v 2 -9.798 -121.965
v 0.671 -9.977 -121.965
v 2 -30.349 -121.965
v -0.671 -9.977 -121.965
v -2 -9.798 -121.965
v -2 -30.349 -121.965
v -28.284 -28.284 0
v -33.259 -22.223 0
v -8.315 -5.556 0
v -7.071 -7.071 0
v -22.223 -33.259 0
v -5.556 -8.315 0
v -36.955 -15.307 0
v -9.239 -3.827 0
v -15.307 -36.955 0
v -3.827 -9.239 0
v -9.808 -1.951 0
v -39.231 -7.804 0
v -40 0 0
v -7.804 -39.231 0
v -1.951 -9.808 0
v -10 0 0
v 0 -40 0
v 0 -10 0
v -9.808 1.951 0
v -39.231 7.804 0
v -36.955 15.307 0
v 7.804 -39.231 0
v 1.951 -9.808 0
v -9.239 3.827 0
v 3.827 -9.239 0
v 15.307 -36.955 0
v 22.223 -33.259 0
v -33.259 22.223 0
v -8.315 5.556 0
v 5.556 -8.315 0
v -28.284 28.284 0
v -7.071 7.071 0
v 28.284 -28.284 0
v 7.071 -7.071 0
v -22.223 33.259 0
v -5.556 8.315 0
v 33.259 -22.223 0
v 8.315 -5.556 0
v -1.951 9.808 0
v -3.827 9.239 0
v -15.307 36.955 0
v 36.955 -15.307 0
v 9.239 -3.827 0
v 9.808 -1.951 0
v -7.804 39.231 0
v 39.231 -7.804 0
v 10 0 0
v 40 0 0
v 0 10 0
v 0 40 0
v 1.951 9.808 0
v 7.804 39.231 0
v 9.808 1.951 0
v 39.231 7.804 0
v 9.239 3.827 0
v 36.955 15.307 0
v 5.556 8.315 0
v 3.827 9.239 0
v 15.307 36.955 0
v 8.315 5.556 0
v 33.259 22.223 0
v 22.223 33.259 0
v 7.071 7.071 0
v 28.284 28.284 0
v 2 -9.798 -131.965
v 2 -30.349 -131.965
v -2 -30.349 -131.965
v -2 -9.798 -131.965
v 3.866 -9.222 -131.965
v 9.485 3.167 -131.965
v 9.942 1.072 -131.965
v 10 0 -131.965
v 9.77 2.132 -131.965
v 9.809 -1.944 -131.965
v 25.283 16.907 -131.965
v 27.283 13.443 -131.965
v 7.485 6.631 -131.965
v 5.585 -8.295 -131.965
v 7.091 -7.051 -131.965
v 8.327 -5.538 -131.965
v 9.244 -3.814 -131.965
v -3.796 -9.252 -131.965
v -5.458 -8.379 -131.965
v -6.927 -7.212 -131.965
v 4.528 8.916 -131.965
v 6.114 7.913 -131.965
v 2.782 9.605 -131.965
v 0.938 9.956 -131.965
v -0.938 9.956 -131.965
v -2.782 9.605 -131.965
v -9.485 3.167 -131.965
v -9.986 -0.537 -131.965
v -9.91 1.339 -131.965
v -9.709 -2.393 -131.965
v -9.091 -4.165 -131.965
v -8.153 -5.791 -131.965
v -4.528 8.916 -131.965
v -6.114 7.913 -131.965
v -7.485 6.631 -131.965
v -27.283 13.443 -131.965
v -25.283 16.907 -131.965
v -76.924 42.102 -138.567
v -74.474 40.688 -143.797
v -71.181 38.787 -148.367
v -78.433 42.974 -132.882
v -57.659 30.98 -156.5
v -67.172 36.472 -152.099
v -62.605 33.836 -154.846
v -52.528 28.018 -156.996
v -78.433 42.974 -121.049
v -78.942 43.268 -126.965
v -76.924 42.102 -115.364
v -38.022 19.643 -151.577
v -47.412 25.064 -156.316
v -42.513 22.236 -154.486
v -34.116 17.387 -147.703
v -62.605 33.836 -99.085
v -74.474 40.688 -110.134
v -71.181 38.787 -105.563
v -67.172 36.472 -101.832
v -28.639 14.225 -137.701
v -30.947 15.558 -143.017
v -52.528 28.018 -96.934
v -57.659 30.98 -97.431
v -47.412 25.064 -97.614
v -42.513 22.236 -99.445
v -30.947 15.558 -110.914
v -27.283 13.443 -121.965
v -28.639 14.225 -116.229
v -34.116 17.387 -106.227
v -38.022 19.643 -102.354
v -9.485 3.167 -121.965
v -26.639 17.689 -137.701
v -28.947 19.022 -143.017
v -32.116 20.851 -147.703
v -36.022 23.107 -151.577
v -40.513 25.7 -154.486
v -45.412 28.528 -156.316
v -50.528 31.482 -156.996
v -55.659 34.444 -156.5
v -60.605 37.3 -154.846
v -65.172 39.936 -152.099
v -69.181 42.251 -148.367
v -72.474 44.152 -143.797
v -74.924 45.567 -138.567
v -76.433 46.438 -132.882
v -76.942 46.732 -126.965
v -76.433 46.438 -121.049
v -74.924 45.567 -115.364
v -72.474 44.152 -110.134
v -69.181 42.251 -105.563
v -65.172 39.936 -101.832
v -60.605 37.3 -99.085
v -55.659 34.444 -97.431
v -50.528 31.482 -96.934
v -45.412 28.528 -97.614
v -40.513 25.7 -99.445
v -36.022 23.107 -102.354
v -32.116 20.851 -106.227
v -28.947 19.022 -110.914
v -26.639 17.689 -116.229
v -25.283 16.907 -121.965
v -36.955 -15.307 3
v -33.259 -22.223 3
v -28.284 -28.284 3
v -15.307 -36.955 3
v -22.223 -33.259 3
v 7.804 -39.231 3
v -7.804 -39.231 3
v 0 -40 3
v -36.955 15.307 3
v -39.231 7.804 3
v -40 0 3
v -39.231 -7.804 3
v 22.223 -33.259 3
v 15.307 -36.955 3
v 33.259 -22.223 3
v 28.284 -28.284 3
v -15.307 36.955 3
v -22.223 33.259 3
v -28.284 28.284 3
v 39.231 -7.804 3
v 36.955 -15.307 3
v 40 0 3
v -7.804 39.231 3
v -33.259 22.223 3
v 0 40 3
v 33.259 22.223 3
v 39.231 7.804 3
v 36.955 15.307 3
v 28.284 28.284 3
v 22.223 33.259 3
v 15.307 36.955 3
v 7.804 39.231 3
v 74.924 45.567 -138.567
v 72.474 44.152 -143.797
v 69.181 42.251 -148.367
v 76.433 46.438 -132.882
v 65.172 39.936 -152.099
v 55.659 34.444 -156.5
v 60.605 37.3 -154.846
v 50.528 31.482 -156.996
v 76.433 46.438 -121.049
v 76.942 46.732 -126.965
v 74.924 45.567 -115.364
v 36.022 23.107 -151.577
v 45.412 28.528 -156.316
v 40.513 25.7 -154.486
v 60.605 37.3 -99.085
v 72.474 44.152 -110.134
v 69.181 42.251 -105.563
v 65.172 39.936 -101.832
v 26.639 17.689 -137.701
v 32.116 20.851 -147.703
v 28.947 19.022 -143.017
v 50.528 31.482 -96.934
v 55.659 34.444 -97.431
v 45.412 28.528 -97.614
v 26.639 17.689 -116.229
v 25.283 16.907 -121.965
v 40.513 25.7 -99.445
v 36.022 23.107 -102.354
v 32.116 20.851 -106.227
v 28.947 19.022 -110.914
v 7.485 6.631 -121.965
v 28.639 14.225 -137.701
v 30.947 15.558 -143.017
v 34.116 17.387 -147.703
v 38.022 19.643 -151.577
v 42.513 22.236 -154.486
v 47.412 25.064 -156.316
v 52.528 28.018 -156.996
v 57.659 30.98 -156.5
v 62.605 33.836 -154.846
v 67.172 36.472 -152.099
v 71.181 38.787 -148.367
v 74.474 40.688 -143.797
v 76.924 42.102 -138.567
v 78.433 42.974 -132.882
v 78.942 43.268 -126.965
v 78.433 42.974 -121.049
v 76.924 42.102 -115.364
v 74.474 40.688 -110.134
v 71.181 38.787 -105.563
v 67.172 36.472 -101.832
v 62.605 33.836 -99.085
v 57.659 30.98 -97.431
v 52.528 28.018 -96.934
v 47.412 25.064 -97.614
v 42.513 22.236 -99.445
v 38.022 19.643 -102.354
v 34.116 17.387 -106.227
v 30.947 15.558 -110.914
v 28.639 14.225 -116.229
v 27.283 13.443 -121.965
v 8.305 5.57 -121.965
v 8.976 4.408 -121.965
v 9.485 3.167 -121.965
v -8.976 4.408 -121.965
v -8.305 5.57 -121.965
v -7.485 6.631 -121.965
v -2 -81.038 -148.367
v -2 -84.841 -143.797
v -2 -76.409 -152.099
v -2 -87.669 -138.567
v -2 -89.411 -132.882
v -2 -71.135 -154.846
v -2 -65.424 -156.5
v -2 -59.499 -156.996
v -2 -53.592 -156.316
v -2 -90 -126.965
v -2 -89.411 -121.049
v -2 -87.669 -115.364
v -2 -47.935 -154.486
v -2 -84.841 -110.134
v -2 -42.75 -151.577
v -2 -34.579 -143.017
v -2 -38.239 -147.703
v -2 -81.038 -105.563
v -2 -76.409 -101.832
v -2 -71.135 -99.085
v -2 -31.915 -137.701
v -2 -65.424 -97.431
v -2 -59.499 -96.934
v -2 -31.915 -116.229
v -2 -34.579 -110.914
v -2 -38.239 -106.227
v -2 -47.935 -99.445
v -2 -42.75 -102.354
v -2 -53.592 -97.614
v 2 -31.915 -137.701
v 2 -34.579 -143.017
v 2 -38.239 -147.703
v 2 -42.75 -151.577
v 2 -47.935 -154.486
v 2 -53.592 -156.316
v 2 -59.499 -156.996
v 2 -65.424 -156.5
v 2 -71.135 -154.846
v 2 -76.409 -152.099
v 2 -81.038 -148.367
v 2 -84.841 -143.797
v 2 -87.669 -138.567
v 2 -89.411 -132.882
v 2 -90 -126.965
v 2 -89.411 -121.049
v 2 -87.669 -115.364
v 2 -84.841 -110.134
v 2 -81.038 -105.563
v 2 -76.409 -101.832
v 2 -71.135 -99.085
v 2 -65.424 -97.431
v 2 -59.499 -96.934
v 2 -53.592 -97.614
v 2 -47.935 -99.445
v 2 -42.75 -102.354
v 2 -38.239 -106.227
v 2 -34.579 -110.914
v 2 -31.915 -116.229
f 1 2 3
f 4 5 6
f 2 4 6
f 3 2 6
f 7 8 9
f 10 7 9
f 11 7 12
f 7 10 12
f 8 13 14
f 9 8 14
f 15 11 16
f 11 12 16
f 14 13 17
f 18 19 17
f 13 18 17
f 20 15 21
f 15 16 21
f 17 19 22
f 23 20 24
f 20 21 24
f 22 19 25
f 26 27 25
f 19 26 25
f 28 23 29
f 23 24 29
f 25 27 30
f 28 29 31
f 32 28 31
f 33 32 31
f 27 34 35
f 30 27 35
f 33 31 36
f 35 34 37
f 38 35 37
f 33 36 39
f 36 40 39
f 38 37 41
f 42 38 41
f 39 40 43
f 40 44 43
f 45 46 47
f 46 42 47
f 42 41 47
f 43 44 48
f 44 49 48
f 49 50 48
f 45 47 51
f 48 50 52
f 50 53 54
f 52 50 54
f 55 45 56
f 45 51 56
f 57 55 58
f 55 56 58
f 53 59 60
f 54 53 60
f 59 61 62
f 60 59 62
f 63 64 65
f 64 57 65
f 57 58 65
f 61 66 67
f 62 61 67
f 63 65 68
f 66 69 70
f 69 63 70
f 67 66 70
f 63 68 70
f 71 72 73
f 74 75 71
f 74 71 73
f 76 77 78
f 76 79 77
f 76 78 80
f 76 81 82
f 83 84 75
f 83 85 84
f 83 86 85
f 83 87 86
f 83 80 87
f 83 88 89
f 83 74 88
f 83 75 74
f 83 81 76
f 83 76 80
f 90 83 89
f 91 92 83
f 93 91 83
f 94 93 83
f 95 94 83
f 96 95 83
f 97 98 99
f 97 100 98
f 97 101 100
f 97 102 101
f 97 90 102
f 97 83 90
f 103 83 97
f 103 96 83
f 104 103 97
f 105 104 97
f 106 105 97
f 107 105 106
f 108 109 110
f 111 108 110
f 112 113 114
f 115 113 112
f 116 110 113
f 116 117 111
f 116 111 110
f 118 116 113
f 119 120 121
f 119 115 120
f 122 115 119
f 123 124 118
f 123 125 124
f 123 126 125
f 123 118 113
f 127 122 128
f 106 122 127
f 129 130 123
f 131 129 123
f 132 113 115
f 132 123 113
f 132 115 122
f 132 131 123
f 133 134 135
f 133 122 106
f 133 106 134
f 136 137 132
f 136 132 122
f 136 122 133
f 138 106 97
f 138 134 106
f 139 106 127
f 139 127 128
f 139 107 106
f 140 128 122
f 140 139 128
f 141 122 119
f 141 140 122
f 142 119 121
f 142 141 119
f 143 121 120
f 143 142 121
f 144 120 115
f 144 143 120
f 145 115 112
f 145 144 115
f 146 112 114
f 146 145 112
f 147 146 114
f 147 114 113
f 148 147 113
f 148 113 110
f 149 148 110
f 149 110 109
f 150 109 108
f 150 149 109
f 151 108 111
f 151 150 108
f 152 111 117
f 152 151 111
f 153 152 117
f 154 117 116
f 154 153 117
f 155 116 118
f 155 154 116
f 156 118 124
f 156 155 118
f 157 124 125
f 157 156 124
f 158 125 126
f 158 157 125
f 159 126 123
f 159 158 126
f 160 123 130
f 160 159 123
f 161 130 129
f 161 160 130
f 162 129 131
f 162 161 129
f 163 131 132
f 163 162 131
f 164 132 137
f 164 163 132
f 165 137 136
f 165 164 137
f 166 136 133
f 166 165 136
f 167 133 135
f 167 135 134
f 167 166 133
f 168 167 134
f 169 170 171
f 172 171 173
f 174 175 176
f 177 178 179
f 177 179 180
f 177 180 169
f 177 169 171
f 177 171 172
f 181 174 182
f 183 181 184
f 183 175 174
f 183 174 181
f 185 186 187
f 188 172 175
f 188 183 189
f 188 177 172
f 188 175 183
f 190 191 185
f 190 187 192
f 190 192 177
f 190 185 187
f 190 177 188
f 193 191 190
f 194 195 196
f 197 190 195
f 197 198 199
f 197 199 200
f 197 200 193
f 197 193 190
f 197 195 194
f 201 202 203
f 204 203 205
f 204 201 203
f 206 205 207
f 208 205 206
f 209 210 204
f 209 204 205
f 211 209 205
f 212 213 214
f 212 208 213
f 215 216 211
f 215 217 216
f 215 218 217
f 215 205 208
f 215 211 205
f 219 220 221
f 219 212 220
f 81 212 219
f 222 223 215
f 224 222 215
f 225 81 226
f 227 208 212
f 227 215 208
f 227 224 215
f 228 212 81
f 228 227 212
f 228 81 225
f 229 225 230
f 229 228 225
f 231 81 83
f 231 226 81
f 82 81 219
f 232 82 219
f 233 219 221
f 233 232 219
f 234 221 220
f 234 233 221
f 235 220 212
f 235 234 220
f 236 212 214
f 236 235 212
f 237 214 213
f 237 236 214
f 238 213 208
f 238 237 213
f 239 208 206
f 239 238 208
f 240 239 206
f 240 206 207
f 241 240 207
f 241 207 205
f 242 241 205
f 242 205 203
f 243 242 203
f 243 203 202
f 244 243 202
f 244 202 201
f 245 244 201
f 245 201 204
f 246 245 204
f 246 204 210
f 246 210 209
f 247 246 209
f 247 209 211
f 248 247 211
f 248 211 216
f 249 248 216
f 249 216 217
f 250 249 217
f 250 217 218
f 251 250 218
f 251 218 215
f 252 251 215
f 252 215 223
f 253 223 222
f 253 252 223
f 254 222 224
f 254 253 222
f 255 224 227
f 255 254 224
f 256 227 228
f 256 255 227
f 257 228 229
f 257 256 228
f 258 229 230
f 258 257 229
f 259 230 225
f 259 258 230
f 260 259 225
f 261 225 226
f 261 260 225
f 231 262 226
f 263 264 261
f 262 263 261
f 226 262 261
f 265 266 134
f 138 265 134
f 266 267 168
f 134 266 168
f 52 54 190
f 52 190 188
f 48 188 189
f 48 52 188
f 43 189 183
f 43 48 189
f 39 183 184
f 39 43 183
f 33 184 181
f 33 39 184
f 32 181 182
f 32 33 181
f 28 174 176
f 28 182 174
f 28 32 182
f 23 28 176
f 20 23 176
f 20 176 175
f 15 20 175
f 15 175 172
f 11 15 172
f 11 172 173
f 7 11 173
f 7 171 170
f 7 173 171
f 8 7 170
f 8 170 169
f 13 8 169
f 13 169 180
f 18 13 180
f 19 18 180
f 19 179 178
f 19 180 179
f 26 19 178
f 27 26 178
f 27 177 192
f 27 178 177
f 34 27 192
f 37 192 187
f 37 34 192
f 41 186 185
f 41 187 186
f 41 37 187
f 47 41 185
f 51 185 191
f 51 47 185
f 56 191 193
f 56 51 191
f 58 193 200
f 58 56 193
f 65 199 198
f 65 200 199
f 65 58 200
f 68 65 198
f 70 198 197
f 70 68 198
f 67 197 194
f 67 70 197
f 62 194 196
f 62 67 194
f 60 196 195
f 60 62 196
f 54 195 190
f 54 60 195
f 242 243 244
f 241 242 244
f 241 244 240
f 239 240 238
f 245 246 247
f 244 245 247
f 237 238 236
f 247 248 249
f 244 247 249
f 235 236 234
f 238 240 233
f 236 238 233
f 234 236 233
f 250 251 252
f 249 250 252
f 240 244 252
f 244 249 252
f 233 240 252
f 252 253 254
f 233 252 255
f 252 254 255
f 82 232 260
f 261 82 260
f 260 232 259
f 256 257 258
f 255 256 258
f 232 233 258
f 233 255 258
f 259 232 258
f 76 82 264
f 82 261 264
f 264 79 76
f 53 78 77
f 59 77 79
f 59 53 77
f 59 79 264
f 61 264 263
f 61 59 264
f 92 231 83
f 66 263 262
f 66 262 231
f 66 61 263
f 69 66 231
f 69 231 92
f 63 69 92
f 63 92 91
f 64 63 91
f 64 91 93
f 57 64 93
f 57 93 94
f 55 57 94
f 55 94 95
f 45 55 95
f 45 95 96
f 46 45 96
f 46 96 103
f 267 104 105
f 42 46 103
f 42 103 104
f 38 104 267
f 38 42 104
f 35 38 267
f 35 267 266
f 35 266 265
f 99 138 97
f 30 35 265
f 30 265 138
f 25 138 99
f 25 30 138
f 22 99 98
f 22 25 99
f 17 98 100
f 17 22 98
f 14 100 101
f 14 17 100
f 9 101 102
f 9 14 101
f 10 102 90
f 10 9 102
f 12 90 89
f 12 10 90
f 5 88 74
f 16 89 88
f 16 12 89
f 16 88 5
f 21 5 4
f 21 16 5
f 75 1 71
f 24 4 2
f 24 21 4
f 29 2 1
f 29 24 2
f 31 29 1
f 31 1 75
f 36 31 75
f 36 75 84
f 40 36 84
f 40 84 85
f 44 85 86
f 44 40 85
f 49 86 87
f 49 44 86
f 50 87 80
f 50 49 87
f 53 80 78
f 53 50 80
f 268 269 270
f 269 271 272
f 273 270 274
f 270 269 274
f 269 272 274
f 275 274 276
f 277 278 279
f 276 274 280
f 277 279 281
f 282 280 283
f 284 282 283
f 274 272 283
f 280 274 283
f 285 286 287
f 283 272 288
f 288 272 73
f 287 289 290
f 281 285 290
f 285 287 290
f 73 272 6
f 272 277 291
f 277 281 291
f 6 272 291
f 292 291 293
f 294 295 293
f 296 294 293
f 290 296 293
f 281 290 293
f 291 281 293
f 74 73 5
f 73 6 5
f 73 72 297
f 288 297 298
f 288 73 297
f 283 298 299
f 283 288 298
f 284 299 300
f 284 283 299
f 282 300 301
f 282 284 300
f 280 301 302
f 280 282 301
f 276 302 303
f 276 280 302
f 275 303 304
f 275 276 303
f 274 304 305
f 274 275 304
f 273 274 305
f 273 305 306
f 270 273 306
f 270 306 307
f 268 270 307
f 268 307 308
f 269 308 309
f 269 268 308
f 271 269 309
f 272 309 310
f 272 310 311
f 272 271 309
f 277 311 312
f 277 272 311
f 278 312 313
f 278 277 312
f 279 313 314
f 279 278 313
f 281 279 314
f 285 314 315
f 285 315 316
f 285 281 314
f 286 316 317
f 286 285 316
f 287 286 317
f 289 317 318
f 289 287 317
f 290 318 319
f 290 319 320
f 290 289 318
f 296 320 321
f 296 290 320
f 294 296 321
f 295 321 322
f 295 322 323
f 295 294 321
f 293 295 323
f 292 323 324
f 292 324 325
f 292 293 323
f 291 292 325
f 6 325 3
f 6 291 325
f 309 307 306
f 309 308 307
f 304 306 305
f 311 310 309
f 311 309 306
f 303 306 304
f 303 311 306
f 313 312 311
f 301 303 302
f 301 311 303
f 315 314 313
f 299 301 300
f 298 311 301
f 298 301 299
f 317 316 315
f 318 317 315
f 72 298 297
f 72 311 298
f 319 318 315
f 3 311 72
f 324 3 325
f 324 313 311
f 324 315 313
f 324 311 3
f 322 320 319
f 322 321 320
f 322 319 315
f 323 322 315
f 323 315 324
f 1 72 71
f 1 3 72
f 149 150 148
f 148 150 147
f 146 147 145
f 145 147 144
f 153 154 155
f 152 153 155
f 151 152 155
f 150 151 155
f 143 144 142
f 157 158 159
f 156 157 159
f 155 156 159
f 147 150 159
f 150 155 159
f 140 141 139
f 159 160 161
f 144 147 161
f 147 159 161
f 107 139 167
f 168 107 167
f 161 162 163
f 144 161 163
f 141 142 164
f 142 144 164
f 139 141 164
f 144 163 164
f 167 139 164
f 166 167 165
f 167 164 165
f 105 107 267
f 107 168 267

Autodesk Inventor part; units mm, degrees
ref_plane "YZ Plane" through (0, 0, 0) normal (1, 0, 0) x (0, 1, 0)
ref_plane "XZ Plane" through (0, 0, 0) normal (0, 1, 0) x (-1, 0, 0)
ref_plane "XY Plane" through (0, 0, 0) normal (0, 0, 1) x (1, 0, 0)
sketch "Sketch1" plane through (0, 0, 0) normal (0, 0, 1) x (1, 0, 0)
  circle A0 centre (0, 0) radius 40
  dimension "d0" = 80
extrude "Extrusion1" add sketch "Sketch1" along normal blind 3
sketch "Sketch2" plane through (0, 0, 3) normal (0, 0, 1) x (1, 0, 0)
  circle A0 centre (0, 0) radius 10
  dimension "d3" = 20
extrude "Extrusion2" add sketch "Sketch2" against normal blind 160
sketch "Sketch3" plane through (0, 0, 0) normal (1, 0, 0) x (0, 1, 0)
  circle A0 centre (-59.9652, -126.9652) radius 30.0348
  line L0 (-10, -157) -> (10, -157) projected
  line L1 (0, -157) -> (0, -174.595) construction
  line L2 (-90, -126.9652) -> (-90, -88.517)
  line L3 (-59.9652, -126.9652) -> (0, -126.9652) construction
  line L4 (0, -126.9652) -> (0, -131.9652)
  line L5 (0, -131.9652) -> (-30.3494, -131.9652)
  line L6 (0, -126.9652) -> (0, -121.9652)
  line L7 (0, -121.9652) -> (-30.3494, -121.9652)
  point P0 (0, 0)
  dimension "d8" = 90
  dimension "d9" = 5
  dimension "d10" = 5
extrude "Extrusion3" add sketch "Sketch3" along normal mid plane 4
sketch "Sketch4" plane through (0, 0, -157) normal (0, 0, -1) x (-1, 0, 0)
  circle A0 centre (-13.7706, 13.7706) radius 35.6894
  point P0 (0, 0)
extrude "Extrusion4" cut sketch "Sketch4" against normal up to surface (25.0348 mm away)
pattern_circular "Circular Pattern1" count 3 over 360 about axis through (0, 0, 3) along (0, 0, -1) of "Extrusion3"
properties part number "manometro idealmente"
